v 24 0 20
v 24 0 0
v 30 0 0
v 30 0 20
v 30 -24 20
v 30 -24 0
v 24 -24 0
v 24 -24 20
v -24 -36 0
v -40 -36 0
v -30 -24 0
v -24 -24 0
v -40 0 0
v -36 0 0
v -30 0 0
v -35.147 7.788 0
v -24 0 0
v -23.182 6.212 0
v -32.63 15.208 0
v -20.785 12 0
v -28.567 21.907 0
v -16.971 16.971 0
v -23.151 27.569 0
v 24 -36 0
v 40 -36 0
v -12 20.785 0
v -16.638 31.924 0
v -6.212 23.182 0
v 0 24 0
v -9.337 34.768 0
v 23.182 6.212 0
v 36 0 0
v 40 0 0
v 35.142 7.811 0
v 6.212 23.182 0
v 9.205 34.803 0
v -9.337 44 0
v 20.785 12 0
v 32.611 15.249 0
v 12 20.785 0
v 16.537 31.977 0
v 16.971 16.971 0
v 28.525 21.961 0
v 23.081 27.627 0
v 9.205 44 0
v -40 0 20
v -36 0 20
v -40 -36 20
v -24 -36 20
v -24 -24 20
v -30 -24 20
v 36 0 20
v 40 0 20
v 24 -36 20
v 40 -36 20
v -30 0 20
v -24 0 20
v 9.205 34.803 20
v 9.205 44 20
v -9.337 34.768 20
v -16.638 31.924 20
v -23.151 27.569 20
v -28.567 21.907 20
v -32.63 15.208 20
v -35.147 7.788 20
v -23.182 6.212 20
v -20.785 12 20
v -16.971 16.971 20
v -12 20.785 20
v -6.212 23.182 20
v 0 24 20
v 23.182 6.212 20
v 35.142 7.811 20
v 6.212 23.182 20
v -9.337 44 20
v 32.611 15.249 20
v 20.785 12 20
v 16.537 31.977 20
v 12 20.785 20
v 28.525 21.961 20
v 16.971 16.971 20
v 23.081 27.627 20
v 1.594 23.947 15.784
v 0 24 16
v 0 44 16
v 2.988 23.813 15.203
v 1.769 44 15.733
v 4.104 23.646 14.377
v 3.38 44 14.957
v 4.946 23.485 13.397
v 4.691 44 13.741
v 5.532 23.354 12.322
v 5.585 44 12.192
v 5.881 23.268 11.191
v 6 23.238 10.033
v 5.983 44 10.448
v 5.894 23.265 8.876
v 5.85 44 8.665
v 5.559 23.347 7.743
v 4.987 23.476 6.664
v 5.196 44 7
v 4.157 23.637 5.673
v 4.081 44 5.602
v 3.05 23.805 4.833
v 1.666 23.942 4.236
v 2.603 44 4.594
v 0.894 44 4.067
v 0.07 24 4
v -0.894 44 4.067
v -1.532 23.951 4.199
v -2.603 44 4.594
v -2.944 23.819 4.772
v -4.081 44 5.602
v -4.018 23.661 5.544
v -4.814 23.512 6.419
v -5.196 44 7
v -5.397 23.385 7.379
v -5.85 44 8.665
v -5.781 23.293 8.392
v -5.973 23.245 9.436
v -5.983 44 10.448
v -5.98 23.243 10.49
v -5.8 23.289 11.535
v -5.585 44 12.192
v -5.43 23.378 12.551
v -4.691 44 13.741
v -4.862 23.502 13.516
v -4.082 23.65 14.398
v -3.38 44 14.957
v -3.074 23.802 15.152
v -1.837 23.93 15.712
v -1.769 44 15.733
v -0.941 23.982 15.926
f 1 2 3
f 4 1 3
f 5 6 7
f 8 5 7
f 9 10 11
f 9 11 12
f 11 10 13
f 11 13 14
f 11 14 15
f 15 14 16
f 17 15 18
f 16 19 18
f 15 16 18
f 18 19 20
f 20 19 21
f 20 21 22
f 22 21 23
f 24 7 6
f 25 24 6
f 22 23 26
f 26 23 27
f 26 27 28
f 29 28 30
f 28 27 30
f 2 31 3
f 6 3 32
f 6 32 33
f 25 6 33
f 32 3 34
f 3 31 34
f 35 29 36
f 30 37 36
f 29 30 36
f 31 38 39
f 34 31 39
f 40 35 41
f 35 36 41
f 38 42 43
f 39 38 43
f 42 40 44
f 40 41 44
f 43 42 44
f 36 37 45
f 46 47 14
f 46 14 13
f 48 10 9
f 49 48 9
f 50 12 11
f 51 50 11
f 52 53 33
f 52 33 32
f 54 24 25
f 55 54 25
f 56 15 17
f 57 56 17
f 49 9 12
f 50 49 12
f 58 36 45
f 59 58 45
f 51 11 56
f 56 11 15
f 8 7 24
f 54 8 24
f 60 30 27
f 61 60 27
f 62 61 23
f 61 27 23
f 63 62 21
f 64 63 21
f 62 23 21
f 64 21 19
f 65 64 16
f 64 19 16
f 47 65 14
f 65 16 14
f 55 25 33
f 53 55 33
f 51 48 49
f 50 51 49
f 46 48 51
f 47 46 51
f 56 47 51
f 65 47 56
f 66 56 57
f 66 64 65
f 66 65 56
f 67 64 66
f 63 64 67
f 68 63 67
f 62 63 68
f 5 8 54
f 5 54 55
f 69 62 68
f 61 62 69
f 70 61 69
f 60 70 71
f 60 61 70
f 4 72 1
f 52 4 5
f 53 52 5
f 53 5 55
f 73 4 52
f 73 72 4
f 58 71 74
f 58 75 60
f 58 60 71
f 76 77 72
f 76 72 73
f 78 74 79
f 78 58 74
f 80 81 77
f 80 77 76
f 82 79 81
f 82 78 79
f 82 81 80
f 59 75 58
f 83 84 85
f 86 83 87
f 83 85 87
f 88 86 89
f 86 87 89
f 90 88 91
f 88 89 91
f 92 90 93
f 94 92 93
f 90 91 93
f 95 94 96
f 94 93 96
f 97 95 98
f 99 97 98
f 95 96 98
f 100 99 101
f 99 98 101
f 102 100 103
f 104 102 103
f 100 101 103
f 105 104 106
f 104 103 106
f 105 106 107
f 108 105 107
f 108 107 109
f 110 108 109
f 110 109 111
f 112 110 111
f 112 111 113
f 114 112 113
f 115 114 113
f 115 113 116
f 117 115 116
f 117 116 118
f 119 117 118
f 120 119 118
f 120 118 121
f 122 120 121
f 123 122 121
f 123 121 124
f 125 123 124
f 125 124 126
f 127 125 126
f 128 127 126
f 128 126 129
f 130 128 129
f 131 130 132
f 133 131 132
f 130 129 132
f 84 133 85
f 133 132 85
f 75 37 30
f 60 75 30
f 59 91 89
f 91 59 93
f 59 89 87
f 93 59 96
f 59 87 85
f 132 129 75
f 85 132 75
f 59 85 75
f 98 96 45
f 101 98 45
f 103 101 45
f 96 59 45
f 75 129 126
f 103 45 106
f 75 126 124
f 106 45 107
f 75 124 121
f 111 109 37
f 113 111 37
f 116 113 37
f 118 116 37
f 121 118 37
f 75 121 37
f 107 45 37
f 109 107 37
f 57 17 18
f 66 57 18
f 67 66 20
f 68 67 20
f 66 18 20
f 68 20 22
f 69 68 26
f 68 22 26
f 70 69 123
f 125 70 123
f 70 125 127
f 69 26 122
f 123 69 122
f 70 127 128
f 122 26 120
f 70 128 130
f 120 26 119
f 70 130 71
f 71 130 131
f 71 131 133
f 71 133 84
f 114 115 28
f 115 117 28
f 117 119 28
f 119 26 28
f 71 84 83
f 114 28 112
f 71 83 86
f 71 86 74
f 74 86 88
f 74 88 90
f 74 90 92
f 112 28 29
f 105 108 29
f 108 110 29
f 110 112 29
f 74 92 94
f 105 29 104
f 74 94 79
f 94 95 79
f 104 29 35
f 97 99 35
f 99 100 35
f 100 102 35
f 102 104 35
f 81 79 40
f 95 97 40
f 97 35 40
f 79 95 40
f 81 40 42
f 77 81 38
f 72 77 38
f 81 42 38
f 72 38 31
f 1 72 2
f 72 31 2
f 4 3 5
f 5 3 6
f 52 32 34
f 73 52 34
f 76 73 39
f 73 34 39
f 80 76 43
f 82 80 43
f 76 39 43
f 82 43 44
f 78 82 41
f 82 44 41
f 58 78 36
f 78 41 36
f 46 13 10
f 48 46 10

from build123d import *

# Parameters (mm, degrees)
Y_KSEKLIK_EKSTR_ZYON1_DEPTH = 20
IZIM2_R                     = 6
KES_EKSTR_ZYON1_DEPTH       = 92.651513899


with BuildPart() as part:
    # Çizim1 → Yükseklik-Ekstrüzyon1 (new body)
    with BuildSketch(Plane.XY):
        with BuildLine():
            Line((-30, -24), (-30, 0))
            Line((-30, 0), (-24, 0))
            ThreePointArc((-24, 0), (0, 24), (24, 0))
            Line((24, 0), (30, 0))
            Line((30, 0), (30, -24))
            Line((30, -24), (24, -24))
            Line((24, -24), (24, -36))
            Line((24, -36), (33, -36))
            Line((33, -36), (40, -36))
            Line((40, -36), (40, -11.038880633))
            Line((40, -11.038880633), (40, 0))
            Line((40, 0), (36, 0))
            ThreePointArc((36, 0), (28.525322537, 21.961465665), (9.205223658, 34.803216193))
            Line((9.205223658, 34.803216193), (9.205223658, 44))
            Line((9.205223658, 44), (-9.33749561, 44))
            Line((-9.33749561, 44), (-9.33749561, 34.767961915))
            ThreePointArc((-9.33749561, 34.767961915), (-28.567025064, 21.907192404), (-36, 0))
            Line((-36, 0), (-40, 0))
            Line((-40, 0), (-40, -11.038880633))
            Line((-40, -11.038880633), (-40, -36))
            Line((-40, -36), (-33.54247299, -36))
            Line((-33.54247299, -36), (-24, -36))
            Line((-24, -36), (-24, -24))
            Line((-24, -24), (-30, -24))
        make_face()
    extrude(amount=Y_KSEKLIK_EKSTR_ZYON1_DEPTH)

    # Çizim2 → Kes-Ekstrüzyon1 (cut, through all)
    with BuildSketch(Plane(origin=(0, 44, 0), x_dir=(1, 0, 0), z_dir=(0, 1, 0))):
        with Locations(Location((0, -10, 0), (0, 0, 270))):
            Circle(IZIM2_R)
    extrude(amount=-KES_EKSTR_ZYON1_DEPTH, mode=Mode.SUBTRACT)


solid = part.part
